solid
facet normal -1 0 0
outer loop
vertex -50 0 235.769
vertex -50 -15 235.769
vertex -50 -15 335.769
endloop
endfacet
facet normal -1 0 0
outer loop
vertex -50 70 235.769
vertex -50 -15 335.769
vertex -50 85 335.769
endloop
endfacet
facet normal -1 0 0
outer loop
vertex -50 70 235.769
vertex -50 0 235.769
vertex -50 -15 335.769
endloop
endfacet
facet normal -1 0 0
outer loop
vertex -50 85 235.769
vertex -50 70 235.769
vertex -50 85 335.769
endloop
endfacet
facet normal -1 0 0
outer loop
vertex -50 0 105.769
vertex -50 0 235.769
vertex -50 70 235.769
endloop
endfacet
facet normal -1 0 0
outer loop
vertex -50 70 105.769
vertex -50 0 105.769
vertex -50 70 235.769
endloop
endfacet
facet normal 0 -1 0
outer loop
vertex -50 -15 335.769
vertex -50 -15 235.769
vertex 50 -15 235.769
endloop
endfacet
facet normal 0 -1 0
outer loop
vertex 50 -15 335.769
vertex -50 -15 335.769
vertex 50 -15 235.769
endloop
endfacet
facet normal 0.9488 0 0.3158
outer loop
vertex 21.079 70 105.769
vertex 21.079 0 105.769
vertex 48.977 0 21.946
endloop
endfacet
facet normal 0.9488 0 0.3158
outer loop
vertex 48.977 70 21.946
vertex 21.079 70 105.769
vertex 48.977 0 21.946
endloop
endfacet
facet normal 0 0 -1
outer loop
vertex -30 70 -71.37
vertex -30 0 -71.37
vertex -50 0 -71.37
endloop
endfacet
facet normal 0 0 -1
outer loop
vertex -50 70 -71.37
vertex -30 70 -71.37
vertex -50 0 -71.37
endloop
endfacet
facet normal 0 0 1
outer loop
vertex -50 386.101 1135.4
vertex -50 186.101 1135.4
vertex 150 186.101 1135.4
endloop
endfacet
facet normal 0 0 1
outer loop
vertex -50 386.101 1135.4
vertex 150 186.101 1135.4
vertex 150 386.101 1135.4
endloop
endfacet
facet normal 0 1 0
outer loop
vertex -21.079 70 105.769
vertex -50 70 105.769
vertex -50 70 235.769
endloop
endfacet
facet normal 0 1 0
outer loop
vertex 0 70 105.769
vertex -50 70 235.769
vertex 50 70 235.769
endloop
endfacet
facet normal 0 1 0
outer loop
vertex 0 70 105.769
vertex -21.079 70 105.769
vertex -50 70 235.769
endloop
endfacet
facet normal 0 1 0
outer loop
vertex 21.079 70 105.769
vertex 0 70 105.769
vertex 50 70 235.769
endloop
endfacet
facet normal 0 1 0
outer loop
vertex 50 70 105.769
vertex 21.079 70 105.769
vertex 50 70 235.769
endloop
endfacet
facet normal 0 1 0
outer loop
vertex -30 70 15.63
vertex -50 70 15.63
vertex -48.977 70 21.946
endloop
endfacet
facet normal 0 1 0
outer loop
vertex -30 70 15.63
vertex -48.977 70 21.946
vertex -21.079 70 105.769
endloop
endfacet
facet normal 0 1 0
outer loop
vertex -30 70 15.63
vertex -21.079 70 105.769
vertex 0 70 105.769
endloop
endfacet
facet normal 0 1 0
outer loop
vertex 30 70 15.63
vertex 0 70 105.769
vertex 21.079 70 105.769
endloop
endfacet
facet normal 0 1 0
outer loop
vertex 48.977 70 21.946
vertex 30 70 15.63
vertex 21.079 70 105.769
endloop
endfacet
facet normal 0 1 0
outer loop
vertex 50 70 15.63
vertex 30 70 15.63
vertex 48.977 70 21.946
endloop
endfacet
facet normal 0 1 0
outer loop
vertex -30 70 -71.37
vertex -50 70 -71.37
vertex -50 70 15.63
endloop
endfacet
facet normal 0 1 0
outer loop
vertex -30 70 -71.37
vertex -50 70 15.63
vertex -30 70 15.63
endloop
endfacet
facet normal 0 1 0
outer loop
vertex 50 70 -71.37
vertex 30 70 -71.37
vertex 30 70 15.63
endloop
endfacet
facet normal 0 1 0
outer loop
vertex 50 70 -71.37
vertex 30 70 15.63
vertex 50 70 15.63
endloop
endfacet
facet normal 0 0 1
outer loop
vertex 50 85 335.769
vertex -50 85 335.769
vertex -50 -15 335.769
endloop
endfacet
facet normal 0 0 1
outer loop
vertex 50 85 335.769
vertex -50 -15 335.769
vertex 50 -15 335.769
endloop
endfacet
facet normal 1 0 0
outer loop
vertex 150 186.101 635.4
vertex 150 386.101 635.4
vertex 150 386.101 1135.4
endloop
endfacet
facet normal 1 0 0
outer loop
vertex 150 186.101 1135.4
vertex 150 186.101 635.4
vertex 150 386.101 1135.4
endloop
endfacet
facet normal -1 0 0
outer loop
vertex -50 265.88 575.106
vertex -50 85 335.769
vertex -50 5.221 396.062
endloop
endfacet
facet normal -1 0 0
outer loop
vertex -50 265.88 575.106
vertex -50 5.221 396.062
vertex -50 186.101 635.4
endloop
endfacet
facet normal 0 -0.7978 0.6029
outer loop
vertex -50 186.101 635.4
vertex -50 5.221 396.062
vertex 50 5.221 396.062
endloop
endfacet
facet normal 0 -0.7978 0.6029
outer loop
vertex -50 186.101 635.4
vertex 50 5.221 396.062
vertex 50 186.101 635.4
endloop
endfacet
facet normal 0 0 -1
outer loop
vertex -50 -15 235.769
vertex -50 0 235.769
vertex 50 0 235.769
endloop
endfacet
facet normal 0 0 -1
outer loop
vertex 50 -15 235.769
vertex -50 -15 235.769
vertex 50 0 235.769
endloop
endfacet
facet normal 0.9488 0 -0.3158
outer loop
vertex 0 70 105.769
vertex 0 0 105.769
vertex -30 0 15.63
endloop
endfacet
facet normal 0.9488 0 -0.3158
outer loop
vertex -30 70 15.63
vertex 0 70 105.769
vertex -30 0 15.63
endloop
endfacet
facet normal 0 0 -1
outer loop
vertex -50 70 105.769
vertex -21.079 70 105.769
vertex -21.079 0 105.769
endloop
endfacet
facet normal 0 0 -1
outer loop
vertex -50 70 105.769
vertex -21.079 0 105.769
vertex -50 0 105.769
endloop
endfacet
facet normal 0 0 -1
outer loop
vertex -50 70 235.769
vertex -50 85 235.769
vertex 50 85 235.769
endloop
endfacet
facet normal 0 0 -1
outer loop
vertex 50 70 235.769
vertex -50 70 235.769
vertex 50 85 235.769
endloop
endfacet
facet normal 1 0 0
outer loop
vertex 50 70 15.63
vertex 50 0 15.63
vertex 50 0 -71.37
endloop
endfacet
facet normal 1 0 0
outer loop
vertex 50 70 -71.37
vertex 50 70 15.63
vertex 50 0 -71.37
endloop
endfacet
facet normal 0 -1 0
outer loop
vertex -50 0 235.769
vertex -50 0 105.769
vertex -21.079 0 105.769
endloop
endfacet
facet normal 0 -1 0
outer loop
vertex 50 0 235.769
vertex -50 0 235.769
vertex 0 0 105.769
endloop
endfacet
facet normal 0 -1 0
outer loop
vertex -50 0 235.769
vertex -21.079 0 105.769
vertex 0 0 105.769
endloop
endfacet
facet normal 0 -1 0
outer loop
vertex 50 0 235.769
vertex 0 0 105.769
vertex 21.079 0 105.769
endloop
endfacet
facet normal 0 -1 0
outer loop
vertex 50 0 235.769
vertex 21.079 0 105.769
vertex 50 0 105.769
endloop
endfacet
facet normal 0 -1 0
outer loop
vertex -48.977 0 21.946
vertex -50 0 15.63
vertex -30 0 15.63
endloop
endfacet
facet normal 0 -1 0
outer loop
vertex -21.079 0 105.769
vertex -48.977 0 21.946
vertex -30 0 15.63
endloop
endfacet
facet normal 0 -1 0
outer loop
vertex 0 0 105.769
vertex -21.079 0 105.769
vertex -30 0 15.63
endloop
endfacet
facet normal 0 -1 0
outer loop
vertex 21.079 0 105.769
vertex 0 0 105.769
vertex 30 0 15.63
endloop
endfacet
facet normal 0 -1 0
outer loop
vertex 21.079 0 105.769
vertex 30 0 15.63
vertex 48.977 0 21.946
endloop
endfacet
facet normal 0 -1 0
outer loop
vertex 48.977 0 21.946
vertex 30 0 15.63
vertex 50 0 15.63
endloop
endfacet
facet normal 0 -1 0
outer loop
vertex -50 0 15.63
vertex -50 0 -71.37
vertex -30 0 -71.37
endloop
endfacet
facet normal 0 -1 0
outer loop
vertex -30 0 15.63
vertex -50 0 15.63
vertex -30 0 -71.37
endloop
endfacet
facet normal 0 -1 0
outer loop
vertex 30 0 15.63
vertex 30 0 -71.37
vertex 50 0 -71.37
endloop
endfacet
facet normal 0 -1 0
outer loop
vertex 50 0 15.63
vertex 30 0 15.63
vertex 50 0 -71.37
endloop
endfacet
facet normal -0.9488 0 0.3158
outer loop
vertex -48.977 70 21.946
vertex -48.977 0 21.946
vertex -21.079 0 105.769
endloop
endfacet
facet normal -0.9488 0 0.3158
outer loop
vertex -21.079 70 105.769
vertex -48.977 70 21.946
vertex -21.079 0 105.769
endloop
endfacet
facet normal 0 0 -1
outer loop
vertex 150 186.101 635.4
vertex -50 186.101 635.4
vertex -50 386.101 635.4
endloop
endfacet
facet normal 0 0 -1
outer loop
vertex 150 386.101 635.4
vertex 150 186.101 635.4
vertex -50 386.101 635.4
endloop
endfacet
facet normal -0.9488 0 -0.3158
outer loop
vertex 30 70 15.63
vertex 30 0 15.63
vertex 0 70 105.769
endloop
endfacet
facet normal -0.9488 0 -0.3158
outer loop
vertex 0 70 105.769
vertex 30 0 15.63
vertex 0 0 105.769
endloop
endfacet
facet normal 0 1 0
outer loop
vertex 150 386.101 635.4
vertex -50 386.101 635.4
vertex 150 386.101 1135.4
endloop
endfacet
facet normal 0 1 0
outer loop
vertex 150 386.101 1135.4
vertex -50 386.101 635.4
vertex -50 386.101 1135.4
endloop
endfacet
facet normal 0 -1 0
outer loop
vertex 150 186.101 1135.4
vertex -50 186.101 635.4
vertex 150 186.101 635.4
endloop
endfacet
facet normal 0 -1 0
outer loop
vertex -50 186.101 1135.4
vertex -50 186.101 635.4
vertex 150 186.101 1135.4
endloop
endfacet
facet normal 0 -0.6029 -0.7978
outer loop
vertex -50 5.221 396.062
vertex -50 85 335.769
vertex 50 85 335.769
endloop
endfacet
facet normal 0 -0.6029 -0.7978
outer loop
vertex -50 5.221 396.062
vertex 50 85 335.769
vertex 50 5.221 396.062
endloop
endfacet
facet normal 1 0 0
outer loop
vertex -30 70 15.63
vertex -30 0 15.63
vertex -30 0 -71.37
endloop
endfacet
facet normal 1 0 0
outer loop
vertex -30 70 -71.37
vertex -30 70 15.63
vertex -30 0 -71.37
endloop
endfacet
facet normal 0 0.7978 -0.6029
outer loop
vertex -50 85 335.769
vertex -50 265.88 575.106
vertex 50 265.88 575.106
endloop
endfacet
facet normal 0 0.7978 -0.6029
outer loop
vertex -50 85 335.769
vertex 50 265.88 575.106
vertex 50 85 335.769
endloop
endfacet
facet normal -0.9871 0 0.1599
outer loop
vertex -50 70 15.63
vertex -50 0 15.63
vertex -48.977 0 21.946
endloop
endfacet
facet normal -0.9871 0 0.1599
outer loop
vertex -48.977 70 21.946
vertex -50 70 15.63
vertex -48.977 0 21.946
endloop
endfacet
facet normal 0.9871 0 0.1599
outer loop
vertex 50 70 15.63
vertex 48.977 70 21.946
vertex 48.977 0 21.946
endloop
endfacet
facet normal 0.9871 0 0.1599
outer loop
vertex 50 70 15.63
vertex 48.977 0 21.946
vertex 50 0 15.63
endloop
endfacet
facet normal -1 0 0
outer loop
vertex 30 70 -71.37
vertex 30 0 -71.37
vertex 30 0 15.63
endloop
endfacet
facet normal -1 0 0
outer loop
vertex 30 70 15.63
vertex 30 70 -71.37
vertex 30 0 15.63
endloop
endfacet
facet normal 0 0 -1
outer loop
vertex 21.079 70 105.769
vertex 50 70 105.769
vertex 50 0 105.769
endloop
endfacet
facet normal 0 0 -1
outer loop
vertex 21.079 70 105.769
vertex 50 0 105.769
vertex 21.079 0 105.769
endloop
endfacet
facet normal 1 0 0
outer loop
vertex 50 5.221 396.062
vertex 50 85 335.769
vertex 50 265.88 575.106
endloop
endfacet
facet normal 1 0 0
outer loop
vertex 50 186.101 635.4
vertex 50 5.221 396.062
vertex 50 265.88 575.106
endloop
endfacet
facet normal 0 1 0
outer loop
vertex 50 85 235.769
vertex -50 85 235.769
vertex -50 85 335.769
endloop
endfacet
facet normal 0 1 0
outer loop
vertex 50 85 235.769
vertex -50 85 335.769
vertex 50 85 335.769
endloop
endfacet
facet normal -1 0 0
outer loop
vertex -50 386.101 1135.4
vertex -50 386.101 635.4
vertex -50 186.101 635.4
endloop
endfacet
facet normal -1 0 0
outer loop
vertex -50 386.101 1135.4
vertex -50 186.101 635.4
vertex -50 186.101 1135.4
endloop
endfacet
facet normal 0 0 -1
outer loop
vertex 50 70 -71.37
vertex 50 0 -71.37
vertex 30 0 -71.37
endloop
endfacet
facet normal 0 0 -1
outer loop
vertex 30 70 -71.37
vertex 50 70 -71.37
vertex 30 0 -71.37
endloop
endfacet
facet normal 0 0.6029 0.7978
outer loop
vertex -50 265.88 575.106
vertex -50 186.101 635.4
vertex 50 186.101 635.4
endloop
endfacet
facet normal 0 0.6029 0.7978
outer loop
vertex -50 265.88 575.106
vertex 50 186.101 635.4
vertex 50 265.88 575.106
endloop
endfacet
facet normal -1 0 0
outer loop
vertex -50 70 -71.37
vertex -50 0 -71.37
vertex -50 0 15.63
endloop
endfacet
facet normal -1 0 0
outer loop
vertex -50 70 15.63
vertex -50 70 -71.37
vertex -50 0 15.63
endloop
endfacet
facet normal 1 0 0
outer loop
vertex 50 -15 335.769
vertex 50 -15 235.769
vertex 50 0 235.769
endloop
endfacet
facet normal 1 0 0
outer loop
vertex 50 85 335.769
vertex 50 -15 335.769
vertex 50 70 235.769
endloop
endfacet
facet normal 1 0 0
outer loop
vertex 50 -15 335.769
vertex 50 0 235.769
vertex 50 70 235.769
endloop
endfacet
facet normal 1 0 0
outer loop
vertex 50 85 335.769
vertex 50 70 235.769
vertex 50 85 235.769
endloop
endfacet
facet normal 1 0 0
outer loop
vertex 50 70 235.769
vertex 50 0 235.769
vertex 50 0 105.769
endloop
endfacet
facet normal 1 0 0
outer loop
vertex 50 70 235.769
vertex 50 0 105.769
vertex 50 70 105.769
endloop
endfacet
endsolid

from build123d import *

# Parameters (mm, degrees)
BOSS_EXTRUDE1_DEPTH = 70
SKETCH2_W           = 100
SKETCH2_H           = 100
BOSS_EXTRUDE2_DEPTH = 100
BOSS_EXTRUDE3_DEPTH = 100
SKETCH4_W           = 500
SKETCH4_H           = 200
BOSS_EXTRUDE4_DEPTH = 200


with BuildPart() as part:
    # Sketch1 → Boss-Extrude1 (new body)
    with BuildSketch(Plane(origin=(0, 0, 0), x_dir=(1, 0, 0), z_dir=(0, 1, 0))):
        Polygon((0, -105.768782521), (-30, -15.630000635), (-30, 71.369999365), (-50, 71.369999365), (-50, -15.630000635), (-48.97658566, -21.945790108), (-21.078607457, -105.768782521), (-50, -105.768782521), (-50, -235.768782521), (50, -235.768782521), (50, -105.768782521), (21.078607457, -105.768782521), (48.97658566, -21.945790108), (50, -15.630000635), (50, 71.369999365), (30, 71.369999365), (30, -15.630000635), align=None)
    extrude(amount=BOSS_EXTRUDE1_DEPTH)

    # Sketch2 → Boss-Extrude2 (add)
    with BuildSketch(Plane.XY.offset(235.768782521)):
        with Locations((0, 35)):
            Rectangle(SKETCH2_W, SKETCH2_H)
    extrude(amount=BOSS_EXTRUDE2_DEPTH)


with BuildPart() as body_2:
    # Sketch3 → Boss-Extrude3 (new body)
    with BuildSketch(Plane.ZY.offset(50)):
        Polygon((335.768782521, 85), (396.06206918, 5.220807325), (635.399647205, 186.100667301), (575.106360546, 265.879859976), align=None)
    extrude(amount=-BOSS_EXTRUDE3_DEPTH)


with BuildPart() as body_3:
    # Sketch4 → Boss-Extrude4 (new body)
    with BuildSketch(Plane.ZY.offset(50)):
        with Locations((885.399647205, 286.100667301)):
            Rectangle(SKETCH4_W, SKETCH4_H)
    extrude(amount=-BOSS_EXTRUDE4_DEPTH)


solid = Compound([part.part, body_2.part, body_3.part])
